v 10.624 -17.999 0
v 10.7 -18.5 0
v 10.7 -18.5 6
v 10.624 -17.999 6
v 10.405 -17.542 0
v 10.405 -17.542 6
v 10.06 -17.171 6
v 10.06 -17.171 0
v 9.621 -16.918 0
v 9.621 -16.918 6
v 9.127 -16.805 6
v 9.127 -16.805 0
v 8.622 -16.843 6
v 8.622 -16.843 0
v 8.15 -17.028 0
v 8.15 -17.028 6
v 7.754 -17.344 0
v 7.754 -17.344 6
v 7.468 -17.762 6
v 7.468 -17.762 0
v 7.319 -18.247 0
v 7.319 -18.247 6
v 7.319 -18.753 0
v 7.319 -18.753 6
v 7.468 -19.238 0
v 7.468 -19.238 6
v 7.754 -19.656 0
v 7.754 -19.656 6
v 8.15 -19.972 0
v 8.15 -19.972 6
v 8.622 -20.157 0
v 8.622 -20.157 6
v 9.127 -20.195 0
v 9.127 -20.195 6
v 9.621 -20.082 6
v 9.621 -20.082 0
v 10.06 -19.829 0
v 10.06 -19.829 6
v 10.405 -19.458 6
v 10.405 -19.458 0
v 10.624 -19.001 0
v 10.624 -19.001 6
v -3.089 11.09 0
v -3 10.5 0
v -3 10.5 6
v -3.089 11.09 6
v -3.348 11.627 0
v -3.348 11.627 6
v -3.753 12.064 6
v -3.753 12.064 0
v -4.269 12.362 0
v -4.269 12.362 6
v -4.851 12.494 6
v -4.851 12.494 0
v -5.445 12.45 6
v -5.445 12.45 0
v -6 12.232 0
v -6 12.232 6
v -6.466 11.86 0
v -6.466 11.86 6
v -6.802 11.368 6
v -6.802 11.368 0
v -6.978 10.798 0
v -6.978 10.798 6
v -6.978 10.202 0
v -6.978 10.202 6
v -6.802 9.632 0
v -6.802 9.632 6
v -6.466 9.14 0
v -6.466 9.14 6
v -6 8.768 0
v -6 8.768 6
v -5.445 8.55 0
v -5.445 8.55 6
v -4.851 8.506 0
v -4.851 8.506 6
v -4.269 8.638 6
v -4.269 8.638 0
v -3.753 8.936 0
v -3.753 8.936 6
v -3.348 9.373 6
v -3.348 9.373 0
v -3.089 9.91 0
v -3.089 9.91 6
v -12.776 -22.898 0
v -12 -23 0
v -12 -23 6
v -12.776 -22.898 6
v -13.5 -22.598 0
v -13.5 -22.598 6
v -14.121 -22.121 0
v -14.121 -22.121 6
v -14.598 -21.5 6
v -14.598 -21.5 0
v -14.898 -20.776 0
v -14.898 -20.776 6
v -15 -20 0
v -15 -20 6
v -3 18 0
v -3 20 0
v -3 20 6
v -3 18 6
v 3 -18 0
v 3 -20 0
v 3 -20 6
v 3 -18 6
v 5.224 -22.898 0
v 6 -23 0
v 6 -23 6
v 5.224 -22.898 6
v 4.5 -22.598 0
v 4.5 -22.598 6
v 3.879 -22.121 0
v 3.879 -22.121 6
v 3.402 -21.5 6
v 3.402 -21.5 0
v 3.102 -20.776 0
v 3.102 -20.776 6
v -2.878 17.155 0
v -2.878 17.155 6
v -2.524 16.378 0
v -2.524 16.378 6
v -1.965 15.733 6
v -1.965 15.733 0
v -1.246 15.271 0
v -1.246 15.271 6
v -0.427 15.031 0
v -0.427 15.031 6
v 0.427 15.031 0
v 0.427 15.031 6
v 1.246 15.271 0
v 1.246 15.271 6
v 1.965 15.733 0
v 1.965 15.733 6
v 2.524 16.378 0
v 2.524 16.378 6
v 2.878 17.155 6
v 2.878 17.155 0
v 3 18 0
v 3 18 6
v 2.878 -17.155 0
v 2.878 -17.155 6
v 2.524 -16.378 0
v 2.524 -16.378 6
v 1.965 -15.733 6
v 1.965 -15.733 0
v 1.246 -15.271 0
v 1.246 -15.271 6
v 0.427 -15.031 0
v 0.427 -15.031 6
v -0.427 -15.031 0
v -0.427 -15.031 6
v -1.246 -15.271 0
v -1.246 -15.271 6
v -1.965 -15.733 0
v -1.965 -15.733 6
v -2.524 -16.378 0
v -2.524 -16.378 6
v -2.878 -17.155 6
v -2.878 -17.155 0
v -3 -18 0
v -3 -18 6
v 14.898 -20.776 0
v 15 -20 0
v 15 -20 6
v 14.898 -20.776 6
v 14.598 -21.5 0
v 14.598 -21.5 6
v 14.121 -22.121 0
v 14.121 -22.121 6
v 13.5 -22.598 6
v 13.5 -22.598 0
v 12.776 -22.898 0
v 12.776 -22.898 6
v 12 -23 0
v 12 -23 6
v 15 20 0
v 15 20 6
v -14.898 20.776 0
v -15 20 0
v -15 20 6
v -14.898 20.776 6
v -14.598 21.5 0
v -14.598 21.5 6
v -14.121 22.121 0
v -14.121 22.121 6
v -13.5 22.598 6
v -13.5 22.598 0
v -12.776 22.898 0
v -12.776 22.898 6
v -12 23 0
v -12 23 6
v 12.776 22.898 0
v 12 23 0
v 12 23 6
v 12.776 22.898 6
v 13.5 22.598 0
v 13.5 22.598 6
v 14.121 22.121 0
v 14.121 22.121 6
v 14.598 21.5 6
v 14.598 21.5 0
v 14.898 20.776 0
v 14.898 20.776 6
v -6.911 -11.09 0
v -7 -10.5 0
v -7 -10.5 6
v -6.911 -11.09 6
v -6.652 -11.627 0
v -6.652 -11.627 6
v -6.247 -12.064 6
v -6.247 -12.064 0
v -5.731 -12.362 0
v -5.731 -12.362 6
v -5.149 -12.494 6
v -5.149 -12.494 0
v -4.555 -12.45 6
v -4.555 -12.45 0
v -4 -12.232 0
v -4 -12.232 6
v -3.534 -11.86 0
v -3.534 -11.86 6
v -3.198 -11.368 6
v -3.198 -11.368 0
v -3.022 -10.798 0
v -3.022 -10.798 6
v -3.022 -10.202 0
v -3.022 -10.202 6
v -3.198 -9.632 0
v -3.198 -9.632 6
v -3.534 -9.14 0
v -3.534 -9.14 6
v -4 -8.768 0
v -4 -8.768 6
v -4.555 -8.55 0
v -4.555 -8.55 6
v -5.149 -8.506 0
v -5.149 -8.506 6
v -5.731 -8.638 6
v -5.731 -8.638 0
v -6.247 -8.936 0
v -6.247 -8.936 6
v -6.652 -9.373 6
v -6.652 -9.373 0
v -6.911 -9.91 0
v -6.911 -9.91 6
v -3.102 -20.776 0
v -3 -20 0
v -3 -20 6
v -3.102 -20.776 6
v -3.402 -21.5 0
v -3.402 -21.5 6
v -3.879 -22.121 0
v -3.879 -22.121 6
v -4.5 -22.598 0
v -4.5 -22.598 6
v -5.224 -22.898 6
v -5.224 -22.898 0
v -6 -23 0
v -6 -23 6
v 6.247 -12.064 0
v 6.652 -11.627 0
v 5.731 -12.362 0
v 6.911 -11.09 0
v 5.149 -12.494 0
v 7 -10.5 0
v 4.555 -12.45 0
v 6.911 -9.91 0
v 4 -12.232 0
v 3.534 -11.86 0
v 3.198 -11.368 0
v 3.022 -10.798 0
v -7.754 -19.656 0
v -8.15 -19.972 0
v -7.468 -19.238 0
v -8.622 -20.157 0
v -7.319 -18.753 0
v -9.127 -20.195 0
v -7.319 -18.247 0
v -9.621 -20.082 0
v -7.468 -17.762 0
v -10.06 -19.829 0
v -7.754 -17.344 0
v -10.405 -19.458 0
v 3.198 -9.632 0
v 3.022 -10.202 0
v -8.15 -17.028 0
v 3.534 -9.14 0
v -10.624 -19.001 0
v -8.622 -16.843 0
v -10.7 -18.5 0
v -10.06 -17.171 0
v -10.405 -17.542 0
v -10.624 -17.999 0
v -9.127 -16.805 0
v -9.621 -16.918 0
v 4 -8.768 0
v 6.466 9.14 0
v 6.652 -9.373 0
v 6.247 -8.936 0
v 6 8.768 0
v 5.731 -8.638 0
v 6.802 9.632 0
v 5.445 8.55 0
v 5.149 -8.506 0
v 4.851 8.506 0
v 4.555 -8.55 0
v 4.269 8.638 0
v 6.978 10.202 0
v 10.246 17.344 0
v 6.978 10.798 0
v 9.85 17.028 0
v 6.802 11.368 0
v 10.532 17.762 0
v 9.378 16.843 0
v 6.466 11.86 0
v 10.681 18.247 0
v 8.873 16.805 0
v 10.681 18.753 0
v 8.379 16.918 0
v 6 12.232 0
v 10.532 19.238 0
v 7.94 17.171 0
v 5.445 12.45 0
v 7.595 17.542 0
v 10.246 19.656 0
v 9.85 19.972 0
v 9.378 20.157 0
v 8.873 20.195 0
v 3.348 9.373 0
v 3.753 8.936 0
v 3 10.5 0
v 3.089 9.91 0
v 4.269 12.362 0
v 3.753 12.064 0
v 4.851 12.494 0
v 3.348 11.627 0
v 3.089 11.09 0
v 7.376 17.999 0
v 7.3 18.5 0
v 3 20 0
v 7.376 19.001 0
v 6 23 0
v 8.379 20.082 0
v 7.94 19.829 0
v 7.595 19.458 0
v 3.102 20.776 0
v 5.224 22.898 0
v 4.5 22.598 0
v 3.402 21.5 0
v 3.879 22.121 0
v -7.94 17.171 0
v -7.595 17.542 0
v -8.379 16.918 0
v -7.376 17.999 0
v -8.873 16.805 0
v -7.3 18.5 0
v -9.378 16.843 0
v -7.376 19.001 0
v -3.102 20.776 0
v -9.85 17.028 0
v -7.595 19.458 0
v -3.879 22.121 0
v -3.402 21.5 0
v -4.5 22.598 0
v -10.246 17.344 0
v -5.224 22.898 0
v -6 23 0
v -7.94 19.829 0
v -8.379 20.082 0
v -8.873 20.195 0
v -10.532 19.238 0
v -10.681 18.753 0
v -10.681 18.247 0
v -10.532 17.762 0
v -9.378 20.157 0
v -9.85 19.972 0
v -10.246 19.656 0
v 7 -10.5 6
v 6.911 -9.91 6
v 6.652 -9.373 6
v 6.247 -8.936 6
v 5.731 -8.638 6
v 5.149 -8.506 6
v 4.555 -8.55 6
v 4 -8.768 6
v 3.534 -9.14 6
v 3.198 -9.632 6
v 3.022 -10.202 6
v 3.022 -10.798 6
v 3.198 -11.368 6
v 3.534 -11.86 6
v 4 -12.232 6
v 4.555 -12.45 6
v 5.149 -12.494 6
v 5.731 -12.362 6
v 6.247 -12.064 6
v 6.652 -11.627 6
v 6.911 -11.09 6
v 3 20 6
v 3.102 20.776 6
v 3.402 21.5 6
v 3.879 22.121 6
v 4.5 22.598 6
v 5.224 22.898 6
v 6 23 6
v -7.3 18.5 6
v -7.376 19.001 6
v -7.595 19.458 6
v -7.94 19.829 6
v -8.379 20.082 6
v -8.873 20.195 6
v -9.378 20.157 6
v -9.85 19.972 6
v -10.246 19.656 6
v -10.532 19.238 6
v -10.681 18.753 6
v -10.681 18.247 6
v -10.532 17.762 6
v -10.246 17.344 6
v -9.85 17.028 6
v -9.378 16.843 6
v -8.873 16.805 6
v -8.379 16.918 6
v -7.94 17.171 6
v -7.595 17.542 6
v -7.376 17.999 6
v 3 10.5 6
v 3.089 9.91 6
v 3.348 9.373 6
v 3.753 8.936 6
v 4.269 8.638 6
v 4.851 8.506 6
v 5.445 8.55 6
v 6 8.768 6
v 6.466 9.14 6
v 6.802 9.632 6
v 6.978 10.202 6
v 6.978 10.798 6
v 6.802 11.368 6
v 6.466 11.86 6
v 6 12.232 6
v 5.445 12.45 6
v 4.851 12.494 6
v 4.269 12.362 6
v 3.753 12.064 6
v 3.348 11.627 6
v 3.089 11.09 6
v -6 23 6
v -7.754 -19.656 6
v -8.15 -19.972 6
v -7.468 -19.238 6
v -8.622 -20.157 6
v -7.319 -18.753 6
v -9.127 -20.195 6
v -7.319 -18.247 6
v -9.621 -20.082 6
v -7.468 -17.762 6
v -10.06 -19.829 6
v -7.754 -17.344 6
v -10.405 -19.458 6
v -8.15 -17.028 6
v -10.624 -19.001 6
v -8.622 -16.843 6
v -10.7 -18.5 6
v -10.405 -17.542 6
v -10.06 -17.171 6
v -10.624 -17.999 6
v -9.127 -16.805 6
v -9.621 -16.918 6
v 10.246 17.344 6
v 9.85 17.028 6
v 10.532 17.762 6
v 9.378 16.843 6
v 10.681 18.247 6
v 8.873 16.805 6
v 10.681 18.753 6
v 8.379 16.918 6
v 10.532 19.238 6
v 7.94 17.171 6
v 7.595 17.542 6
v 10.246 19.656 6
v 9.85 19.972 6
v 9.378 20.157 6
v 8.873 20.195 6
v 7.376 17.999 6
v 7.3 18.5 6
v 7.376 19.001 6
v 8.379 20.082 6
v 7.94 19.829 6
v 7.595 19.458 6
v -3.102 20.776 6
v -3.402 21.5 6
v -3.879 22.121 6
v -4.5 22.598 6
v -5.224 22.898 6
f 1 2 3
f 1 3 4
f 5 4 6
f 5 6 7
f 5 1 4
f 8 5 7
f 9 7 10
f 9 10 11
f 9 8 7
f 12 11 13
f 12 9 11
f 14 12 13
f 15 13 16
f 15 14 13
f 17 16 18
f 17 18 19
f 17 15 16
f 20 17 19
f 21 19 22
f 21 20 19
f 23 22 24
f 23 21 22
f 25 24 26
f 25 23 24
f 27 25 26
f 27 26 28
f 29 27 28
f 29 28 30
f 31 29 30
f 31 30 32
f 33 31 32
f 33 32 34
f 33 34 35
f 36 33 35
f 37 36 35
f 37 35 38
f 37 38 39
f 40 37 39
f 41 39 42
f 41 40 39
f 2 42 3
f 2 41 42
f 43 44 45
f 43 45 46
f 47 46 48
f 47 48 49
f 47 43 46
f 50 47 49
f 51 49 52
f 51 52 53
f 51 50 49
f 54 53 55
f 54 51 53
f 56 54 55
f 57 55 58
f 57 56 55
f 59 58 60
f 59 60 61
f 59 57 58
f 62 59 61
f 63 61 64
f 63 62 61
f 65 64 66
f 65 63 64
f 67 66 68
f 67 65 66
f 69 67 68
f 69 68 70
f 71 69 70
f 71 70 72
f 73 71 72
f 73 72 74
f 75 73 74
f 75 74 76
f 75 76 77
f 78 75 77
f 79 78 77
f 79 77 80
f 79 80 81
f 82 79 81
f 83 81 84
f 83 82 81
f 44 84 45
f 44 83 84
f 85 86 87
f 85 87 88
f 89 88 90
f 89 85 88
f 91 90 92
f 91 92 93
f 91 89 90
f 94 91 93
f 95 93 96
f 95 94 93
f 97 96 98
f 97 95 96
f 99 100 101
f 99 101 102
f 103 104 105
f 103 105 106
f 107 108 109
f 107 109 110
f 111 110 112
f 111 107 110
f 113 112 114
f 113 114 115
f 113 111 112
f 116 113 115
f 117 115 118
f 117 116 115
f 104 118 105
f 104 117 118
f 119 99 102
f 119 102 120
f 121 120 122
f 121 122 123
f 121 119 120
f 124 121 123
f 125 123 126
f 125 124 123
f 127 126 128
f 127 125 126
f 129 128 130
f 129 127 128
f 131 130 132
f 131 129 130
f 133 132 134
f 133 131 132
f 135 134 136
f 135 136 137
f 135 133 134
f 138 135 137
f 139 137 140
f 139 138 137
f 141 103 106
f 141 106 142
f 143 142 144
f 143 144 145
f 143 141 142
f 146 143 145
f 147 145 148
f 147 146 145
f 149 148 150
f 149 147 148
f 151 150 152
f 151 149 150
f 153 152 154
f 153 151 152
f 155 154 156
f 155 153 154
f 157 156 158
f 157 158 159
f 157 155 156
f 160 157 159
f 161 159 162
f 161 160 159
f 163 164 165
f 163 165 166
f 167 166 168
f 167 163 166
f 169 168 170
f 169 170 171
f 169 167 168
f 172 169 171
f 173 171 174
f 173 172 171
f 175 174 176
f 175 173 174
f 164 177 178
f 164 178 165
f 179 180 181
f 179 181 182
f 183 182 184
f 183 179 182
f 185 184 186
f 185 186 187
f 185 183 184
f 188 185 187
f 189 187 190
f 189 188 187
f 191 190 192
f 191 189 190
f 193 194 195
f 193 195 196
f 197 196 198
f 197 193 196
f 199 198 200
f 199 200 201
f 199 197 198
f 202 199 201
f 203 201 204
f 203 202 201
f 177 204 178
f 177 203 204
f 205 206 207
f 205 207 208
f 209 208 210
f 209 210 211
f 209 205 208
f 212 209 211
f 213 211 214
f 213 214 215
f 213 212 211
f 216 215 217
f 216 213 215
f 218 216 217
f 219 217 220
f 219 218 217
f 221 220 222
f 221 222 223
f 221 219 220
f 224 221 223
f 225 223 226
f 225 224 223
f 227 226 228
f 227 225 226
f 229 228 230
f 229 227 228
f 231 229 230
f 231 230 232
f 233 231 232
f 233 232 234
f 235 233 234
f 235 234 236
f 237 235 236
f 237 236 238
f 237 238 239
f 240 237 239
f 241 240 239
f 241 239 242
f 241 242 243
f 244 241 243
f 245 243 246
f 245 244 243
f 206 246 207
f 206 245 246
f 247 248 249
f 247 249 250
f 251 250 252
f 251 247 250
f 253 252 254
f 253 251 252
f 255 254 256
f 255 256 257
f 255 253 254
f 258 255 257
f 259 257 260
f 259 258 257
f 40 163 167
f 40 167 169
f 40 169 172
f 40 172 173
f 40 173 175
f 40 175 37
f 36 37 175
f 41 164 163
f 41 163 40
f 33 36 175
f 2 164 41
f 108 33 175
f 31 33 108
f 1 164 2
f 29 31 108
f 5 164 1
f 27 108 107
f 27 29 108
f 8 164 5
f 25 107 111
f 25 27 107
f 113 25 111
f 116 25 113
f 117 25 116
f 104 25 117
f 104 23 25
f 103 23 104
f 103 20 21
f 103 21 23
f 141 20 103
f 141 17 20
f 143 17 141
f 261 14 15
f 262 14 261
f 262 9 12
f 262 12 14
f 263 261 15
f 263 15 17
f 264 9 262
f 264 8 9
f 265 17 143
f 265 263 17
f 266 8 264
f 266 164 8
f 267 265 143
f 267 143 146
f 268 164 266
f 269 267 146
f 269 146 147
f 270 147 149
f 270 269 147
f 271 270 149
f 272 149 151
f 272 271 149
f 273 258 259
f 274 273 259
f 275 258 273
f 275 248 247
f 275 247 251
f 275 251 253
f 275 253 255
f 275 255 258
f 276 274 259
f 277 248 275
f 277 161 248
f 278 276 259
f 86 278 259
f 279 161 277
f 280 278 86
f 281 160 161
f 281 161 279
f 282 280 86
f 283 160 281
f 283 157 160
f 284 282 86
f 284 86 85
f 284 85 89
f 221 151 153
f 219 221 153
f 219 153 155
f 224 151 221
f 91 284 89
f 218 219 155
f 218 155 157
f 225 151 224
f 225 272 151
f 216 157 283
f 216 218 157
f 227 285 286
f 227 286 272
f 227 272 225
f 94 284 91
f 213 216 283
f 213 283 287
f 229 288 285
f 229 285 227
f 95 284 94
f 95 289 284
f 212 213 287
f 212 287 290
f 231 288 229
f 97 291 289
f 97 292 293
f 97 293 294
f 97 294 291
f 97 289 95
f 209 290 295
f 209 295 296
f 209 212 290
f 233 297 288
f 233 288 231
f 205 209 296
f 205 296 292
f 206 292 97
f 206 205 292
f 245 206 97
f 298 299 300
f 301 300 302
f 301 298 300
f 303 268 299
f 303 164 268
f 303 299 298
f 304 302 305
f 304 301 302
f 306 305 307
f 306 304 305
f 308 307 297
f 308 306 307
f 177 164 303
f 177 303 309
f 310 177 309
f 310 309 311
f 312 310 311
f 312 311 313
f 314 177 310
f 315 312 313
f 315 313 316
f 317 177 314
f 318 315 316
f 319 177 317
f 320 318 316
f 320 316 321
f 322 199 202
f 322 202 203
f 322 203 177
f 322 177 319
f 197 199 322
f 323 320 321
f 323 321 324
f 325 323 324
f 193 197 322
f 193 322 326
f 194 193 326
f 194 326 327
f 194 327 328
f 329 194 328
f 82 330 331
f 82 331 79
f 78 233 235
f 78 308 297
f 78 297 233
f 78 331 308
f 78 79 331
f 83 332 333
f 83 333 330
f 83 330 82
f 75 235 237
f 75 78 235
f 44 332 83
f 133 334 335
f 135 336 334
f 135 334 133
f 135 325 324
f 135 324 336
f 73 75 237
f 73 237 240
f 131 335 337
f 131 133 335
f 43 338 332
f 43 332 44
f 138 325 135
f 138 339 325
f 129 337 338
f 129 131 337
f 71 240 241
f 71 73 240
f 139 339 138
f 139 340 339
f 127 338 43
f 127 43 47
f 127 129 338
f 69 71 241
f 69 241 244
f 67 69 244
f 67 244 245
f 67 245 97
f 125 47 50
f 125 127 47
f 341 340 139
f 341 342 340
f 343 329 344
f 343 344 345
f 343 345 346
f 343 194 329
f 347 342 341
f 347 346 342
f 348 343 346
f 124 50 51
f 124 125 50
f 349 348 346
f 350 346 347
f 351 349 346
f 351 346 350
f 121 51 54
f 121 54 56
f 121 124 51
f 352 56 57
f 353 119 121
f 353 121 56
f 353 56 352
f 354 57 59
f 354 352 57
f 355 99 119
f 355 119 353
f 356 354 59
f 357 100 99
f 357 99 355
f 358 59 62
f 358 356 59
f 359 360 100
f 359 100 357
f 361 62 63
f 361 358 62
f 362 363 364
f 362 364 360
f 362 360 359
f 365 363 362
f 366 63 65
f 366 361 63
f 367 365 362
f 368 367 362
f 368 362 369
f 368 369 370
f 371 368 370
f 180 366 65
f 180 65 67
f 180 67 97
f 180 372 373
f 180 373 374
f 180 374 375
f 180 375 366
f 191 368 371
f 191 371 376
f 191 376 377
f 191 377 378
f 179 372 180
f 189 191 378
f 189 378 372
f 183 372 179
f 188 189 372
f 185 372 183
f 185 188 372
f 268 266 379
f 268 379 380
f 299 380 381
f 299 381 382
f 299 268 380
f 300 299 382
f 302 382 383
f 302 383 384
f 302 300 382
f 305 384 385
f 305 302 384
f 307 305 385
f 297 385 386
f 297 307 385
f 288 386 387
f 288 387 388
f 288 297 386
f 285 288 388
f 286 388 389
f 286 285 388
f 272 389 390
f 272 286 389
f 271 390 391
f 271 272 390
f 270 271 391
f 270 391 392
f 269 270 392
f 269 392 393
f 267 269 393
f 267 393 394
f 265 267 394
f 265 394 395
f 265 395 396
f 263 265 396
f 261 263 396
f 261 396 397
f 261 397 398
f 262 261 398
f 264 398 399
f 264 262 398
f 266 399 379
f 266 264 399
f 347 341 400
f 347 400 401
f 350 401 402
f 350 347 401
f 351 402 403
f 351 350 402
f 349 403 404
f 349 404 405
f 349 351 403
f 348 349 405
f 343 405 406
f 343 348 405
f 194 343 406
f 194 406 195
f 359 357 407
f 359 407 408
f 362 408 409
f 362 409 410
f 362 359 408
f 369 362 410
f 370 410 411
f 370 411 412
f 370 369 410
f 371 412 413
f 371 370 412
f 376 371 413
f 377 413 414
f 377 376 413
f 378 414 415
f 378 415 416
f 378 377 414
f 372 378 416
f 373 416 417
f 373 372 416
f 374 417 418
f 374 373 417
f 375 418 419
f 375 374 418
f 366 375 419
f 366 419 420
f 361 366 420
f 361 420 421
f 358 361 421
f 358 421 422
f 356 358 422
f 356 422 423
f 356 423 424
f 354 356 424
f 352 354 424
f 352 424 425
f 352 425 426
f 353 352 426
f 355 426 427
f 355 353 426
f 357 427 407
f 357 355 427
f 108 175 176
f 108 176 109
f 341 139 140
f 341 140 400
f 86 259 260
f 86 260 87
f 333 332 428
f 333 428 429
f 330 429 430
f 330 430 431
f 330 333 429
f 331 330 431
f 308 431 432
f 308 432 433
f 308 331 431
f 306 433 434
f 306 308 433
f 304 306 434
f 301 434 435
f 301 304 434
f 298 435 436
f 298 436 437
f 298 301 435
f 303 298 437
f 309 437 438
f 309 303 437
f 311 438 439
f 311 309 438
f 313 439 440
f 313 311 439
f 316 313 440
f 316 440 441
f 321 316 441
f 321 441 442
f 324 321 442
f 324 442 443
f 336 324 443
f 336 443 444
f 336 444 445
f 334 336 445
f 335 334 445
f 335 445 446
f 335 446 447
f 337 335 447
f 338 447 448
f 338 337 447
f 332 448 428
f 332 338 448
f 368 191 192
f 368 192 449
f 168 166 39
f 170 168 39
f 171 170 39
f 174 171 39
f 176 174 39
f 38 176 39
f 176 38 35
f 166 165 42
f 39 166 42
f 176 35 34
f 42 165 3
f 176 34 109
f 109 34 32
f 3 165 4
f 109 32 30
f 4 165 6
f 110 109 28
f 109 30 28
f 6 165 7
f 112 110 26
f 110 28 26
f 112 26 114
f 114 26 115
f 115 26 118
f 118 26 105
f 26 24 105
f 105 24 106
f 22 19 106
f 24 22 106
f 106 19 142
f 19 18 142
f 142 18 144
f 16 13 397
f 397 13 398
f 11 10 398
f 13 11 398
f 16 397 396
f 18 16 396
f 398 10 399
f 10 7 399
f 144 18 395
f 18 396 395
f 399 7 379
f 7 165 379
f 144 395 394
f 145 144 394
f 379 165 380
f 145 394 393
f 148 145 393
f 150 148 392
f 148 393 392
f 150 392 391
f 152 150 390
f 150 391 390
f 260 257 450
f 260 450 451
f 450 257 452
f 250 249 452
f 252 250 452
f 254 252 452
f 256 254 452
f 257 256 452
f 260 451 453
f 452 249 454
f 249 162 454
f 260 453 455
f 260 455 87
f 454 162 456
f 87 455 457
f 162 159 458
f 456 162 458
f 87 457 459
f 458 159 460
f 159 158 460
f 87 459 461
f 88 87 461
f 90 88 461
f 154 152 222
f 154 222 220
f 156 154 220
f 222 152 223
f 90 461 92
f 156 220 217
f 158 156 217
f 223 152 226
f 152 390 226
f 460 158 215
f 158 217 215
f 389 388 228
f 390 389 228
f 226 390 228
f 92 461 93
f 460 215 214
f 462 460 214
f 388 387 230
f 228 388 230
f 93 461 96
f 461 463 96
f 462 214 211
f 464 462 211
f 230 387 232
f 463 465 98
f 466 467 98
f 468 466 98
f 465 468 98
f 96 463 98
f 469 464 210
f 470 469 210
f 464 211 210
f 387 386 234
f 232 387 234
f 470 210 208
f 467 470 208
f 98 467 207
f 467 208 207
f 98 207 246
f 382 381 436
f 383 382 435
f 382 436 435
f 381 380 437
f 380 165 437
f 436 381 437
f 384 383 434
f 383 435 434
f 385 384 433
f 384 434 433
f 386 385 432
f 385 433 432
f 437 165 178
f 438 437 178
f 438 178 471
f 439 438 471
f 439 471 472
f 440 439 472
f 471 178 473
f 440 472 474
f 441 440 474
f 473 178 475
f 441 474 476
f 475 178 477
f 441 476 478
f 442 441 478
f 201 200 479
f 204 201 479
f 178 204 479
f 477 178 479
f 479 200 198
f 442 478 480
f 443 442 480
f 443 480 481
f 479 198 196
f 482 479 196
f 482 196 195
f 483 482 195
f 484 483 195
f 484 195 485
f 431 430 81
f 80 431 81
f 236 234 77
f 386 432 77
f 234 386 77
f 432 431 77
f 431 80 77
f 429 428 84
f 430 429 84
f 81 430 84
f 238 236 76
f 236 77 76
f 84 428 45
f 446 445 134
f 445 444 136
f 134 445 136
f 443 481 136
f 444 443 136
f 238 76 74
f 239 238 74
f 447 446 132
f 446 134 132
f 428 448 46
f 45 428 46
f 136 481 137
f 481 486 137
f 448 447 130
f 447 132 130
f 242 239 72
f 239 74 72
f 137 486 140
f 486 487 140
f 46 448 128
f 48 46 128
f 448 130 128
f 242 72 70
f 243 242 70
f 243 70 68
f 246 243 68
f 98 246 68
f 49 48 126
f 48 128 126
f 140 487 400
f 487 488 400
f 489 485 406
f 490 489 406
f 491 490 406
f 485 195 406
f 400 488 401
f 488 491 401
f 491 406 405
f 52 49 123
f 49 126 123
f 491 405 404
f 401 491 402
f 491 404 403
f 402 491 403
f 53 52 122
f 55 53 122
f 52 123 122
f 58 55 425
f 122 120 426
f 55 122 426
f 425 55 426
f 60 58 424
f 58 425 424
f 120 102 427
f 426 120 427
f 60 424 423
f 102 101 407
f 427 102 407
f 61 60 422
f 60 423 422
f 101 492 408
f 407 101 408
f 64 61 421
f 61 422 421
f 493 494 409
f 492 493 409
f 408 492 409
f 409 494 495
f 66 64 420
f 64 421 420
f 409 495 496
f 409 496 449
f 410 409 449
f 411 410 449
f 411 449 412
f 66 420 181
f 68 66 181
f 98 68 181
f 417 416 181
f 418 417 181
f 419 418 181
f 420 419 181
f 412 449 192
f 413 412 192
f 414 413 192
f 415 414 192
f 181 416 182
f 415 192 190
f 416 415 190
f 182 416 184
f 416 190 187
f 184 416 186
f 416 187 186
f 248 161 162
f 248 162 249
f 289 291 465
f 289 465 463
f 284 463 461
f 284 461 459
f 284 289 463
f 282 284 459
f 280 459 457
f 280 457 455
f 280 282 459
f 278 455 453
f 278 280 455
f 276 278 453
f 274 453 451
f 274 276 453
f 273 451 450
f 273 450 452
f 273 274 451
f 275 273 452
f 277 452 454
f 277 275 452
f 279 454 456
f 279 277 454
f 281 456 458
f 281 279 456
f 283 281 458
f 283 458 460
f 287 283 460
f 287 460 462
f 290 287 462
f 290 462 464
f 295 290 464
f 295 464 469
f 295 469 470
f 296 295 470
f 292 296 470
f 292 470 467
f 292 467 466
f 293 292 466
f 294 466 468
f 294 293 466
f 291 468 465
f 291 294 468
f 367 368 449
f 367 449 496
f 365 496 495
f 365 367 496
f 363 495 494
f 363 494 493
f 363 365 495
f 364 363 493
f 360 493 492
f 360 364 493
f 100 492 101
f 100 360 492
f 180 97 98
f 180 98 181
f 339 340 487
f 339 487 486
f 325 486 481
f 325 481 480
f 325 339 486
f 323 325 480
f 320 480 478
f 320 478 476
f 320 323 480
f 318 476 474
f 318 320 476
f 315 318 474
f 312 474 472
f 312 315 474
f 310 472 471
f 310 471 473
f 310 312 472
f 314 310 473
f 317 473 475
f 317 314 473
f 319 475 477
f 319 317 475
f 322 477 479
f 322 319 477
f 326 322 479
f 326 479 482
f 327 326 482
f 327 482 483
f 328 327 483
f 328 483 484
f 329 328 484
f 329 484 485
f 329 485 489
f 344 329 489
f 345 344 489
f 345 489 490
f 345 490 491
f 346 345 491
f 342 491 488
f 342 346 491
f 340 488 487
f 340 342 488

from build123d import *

# Parameters (mm, degrees)
SKETCH1_R           = 1.7
SKETCH1_R_2         = 2
BOSS_EXTRUDE1_DEPTH = 6


with BuildPart() as part:
    # Sketch1 → Boss-Extrude1 (new body)
    with BuildSketch(Plane.XY):
        with BuildLine():
            Line((-12, 23), (-6, 23))
            ThreePointArc((-6, 23), (-3.878679656, 22.121320344), (-3, 20))
            Line((-3, 20), (-3, 18))
            ThreePointArc((-3, 18), (0, 15), (3, 18))
            Line((3, 18), (3, 20))
            ThreePointArc((3, 20), (3.878679656, 22.121320344), (6, 23))
            Line((6, 23), (12, 23))
            ThreePointArc((12, 23), (14.121320344, 22.121320344), (15, 20))
            Line((15, 20), (15, -20))
            ThreePointArc((15, -20), (14.121320344, -22.121320344), (12, -23))
            Line((12, -23), (6, -23))
            ThreePointArc((6, -23), (3.878679656, -22.121320344), (3, -20))
            Line((3, -20), (3, -18))
            ThreePointArc((3, -18), (0, -15), (-3, -18))
            Line((-3, -18), (-3, -20))
            ThreePointArc((-3, -20), (-3.878679656, -22.121320344), (-6, -23))
            Line((-6, -23), (-12, -23))
            ThreePointArc((-12, -23), (-14.121320344, -22.121320344), (-15, -20))
            Line((-15, -20), (-15, 20))
            ThreePointArc((-15, 20), (-14.121320344, 22.121320344), (-12, 23))
        make_face()
        with Locations((-9, 18.5)):
            Circle(SKETCH1_R, mode=Mode.SUBTRACT)
        with Locations(Location((9, 18.5, 0), (0, 0, 180))):
            Circle(SKETCH1_R, mode=Mode.SUBTRACT)
        with Locations((9, -18.5)):
            Circle(SKETCH1_R, mode=Mode.SUBTRACT)
        with Locations(Location((-9, -18.5, 0), (0, 0, 180))):
            Circle(SKETCH1_R, mode=Mode.SUBTRACT)
        with Locations((-5, 10.5)):
            Circle(SKETCH1_R_2, mode=Mode.SUBTRACT)
        with Locations(Location((5, 10.5, 0), (0, 0, 180))):
            Circle(SKETCH1_R_2, mode=Mode.SUBTRACT)
        with Locations((5, -10.5)):
            Circle(SKETCH1_R_2, mode=Mode.SUBTRACT)
        with Locations(Location((-5, -10.5, 0), (0, 0, 180))):
            Circle(SKETCH1_R_2, mode=Mode.SUBTRACT)
    extrude(amount=BOSS_EXTRUDE1_DEPTH)


solid = part.part
